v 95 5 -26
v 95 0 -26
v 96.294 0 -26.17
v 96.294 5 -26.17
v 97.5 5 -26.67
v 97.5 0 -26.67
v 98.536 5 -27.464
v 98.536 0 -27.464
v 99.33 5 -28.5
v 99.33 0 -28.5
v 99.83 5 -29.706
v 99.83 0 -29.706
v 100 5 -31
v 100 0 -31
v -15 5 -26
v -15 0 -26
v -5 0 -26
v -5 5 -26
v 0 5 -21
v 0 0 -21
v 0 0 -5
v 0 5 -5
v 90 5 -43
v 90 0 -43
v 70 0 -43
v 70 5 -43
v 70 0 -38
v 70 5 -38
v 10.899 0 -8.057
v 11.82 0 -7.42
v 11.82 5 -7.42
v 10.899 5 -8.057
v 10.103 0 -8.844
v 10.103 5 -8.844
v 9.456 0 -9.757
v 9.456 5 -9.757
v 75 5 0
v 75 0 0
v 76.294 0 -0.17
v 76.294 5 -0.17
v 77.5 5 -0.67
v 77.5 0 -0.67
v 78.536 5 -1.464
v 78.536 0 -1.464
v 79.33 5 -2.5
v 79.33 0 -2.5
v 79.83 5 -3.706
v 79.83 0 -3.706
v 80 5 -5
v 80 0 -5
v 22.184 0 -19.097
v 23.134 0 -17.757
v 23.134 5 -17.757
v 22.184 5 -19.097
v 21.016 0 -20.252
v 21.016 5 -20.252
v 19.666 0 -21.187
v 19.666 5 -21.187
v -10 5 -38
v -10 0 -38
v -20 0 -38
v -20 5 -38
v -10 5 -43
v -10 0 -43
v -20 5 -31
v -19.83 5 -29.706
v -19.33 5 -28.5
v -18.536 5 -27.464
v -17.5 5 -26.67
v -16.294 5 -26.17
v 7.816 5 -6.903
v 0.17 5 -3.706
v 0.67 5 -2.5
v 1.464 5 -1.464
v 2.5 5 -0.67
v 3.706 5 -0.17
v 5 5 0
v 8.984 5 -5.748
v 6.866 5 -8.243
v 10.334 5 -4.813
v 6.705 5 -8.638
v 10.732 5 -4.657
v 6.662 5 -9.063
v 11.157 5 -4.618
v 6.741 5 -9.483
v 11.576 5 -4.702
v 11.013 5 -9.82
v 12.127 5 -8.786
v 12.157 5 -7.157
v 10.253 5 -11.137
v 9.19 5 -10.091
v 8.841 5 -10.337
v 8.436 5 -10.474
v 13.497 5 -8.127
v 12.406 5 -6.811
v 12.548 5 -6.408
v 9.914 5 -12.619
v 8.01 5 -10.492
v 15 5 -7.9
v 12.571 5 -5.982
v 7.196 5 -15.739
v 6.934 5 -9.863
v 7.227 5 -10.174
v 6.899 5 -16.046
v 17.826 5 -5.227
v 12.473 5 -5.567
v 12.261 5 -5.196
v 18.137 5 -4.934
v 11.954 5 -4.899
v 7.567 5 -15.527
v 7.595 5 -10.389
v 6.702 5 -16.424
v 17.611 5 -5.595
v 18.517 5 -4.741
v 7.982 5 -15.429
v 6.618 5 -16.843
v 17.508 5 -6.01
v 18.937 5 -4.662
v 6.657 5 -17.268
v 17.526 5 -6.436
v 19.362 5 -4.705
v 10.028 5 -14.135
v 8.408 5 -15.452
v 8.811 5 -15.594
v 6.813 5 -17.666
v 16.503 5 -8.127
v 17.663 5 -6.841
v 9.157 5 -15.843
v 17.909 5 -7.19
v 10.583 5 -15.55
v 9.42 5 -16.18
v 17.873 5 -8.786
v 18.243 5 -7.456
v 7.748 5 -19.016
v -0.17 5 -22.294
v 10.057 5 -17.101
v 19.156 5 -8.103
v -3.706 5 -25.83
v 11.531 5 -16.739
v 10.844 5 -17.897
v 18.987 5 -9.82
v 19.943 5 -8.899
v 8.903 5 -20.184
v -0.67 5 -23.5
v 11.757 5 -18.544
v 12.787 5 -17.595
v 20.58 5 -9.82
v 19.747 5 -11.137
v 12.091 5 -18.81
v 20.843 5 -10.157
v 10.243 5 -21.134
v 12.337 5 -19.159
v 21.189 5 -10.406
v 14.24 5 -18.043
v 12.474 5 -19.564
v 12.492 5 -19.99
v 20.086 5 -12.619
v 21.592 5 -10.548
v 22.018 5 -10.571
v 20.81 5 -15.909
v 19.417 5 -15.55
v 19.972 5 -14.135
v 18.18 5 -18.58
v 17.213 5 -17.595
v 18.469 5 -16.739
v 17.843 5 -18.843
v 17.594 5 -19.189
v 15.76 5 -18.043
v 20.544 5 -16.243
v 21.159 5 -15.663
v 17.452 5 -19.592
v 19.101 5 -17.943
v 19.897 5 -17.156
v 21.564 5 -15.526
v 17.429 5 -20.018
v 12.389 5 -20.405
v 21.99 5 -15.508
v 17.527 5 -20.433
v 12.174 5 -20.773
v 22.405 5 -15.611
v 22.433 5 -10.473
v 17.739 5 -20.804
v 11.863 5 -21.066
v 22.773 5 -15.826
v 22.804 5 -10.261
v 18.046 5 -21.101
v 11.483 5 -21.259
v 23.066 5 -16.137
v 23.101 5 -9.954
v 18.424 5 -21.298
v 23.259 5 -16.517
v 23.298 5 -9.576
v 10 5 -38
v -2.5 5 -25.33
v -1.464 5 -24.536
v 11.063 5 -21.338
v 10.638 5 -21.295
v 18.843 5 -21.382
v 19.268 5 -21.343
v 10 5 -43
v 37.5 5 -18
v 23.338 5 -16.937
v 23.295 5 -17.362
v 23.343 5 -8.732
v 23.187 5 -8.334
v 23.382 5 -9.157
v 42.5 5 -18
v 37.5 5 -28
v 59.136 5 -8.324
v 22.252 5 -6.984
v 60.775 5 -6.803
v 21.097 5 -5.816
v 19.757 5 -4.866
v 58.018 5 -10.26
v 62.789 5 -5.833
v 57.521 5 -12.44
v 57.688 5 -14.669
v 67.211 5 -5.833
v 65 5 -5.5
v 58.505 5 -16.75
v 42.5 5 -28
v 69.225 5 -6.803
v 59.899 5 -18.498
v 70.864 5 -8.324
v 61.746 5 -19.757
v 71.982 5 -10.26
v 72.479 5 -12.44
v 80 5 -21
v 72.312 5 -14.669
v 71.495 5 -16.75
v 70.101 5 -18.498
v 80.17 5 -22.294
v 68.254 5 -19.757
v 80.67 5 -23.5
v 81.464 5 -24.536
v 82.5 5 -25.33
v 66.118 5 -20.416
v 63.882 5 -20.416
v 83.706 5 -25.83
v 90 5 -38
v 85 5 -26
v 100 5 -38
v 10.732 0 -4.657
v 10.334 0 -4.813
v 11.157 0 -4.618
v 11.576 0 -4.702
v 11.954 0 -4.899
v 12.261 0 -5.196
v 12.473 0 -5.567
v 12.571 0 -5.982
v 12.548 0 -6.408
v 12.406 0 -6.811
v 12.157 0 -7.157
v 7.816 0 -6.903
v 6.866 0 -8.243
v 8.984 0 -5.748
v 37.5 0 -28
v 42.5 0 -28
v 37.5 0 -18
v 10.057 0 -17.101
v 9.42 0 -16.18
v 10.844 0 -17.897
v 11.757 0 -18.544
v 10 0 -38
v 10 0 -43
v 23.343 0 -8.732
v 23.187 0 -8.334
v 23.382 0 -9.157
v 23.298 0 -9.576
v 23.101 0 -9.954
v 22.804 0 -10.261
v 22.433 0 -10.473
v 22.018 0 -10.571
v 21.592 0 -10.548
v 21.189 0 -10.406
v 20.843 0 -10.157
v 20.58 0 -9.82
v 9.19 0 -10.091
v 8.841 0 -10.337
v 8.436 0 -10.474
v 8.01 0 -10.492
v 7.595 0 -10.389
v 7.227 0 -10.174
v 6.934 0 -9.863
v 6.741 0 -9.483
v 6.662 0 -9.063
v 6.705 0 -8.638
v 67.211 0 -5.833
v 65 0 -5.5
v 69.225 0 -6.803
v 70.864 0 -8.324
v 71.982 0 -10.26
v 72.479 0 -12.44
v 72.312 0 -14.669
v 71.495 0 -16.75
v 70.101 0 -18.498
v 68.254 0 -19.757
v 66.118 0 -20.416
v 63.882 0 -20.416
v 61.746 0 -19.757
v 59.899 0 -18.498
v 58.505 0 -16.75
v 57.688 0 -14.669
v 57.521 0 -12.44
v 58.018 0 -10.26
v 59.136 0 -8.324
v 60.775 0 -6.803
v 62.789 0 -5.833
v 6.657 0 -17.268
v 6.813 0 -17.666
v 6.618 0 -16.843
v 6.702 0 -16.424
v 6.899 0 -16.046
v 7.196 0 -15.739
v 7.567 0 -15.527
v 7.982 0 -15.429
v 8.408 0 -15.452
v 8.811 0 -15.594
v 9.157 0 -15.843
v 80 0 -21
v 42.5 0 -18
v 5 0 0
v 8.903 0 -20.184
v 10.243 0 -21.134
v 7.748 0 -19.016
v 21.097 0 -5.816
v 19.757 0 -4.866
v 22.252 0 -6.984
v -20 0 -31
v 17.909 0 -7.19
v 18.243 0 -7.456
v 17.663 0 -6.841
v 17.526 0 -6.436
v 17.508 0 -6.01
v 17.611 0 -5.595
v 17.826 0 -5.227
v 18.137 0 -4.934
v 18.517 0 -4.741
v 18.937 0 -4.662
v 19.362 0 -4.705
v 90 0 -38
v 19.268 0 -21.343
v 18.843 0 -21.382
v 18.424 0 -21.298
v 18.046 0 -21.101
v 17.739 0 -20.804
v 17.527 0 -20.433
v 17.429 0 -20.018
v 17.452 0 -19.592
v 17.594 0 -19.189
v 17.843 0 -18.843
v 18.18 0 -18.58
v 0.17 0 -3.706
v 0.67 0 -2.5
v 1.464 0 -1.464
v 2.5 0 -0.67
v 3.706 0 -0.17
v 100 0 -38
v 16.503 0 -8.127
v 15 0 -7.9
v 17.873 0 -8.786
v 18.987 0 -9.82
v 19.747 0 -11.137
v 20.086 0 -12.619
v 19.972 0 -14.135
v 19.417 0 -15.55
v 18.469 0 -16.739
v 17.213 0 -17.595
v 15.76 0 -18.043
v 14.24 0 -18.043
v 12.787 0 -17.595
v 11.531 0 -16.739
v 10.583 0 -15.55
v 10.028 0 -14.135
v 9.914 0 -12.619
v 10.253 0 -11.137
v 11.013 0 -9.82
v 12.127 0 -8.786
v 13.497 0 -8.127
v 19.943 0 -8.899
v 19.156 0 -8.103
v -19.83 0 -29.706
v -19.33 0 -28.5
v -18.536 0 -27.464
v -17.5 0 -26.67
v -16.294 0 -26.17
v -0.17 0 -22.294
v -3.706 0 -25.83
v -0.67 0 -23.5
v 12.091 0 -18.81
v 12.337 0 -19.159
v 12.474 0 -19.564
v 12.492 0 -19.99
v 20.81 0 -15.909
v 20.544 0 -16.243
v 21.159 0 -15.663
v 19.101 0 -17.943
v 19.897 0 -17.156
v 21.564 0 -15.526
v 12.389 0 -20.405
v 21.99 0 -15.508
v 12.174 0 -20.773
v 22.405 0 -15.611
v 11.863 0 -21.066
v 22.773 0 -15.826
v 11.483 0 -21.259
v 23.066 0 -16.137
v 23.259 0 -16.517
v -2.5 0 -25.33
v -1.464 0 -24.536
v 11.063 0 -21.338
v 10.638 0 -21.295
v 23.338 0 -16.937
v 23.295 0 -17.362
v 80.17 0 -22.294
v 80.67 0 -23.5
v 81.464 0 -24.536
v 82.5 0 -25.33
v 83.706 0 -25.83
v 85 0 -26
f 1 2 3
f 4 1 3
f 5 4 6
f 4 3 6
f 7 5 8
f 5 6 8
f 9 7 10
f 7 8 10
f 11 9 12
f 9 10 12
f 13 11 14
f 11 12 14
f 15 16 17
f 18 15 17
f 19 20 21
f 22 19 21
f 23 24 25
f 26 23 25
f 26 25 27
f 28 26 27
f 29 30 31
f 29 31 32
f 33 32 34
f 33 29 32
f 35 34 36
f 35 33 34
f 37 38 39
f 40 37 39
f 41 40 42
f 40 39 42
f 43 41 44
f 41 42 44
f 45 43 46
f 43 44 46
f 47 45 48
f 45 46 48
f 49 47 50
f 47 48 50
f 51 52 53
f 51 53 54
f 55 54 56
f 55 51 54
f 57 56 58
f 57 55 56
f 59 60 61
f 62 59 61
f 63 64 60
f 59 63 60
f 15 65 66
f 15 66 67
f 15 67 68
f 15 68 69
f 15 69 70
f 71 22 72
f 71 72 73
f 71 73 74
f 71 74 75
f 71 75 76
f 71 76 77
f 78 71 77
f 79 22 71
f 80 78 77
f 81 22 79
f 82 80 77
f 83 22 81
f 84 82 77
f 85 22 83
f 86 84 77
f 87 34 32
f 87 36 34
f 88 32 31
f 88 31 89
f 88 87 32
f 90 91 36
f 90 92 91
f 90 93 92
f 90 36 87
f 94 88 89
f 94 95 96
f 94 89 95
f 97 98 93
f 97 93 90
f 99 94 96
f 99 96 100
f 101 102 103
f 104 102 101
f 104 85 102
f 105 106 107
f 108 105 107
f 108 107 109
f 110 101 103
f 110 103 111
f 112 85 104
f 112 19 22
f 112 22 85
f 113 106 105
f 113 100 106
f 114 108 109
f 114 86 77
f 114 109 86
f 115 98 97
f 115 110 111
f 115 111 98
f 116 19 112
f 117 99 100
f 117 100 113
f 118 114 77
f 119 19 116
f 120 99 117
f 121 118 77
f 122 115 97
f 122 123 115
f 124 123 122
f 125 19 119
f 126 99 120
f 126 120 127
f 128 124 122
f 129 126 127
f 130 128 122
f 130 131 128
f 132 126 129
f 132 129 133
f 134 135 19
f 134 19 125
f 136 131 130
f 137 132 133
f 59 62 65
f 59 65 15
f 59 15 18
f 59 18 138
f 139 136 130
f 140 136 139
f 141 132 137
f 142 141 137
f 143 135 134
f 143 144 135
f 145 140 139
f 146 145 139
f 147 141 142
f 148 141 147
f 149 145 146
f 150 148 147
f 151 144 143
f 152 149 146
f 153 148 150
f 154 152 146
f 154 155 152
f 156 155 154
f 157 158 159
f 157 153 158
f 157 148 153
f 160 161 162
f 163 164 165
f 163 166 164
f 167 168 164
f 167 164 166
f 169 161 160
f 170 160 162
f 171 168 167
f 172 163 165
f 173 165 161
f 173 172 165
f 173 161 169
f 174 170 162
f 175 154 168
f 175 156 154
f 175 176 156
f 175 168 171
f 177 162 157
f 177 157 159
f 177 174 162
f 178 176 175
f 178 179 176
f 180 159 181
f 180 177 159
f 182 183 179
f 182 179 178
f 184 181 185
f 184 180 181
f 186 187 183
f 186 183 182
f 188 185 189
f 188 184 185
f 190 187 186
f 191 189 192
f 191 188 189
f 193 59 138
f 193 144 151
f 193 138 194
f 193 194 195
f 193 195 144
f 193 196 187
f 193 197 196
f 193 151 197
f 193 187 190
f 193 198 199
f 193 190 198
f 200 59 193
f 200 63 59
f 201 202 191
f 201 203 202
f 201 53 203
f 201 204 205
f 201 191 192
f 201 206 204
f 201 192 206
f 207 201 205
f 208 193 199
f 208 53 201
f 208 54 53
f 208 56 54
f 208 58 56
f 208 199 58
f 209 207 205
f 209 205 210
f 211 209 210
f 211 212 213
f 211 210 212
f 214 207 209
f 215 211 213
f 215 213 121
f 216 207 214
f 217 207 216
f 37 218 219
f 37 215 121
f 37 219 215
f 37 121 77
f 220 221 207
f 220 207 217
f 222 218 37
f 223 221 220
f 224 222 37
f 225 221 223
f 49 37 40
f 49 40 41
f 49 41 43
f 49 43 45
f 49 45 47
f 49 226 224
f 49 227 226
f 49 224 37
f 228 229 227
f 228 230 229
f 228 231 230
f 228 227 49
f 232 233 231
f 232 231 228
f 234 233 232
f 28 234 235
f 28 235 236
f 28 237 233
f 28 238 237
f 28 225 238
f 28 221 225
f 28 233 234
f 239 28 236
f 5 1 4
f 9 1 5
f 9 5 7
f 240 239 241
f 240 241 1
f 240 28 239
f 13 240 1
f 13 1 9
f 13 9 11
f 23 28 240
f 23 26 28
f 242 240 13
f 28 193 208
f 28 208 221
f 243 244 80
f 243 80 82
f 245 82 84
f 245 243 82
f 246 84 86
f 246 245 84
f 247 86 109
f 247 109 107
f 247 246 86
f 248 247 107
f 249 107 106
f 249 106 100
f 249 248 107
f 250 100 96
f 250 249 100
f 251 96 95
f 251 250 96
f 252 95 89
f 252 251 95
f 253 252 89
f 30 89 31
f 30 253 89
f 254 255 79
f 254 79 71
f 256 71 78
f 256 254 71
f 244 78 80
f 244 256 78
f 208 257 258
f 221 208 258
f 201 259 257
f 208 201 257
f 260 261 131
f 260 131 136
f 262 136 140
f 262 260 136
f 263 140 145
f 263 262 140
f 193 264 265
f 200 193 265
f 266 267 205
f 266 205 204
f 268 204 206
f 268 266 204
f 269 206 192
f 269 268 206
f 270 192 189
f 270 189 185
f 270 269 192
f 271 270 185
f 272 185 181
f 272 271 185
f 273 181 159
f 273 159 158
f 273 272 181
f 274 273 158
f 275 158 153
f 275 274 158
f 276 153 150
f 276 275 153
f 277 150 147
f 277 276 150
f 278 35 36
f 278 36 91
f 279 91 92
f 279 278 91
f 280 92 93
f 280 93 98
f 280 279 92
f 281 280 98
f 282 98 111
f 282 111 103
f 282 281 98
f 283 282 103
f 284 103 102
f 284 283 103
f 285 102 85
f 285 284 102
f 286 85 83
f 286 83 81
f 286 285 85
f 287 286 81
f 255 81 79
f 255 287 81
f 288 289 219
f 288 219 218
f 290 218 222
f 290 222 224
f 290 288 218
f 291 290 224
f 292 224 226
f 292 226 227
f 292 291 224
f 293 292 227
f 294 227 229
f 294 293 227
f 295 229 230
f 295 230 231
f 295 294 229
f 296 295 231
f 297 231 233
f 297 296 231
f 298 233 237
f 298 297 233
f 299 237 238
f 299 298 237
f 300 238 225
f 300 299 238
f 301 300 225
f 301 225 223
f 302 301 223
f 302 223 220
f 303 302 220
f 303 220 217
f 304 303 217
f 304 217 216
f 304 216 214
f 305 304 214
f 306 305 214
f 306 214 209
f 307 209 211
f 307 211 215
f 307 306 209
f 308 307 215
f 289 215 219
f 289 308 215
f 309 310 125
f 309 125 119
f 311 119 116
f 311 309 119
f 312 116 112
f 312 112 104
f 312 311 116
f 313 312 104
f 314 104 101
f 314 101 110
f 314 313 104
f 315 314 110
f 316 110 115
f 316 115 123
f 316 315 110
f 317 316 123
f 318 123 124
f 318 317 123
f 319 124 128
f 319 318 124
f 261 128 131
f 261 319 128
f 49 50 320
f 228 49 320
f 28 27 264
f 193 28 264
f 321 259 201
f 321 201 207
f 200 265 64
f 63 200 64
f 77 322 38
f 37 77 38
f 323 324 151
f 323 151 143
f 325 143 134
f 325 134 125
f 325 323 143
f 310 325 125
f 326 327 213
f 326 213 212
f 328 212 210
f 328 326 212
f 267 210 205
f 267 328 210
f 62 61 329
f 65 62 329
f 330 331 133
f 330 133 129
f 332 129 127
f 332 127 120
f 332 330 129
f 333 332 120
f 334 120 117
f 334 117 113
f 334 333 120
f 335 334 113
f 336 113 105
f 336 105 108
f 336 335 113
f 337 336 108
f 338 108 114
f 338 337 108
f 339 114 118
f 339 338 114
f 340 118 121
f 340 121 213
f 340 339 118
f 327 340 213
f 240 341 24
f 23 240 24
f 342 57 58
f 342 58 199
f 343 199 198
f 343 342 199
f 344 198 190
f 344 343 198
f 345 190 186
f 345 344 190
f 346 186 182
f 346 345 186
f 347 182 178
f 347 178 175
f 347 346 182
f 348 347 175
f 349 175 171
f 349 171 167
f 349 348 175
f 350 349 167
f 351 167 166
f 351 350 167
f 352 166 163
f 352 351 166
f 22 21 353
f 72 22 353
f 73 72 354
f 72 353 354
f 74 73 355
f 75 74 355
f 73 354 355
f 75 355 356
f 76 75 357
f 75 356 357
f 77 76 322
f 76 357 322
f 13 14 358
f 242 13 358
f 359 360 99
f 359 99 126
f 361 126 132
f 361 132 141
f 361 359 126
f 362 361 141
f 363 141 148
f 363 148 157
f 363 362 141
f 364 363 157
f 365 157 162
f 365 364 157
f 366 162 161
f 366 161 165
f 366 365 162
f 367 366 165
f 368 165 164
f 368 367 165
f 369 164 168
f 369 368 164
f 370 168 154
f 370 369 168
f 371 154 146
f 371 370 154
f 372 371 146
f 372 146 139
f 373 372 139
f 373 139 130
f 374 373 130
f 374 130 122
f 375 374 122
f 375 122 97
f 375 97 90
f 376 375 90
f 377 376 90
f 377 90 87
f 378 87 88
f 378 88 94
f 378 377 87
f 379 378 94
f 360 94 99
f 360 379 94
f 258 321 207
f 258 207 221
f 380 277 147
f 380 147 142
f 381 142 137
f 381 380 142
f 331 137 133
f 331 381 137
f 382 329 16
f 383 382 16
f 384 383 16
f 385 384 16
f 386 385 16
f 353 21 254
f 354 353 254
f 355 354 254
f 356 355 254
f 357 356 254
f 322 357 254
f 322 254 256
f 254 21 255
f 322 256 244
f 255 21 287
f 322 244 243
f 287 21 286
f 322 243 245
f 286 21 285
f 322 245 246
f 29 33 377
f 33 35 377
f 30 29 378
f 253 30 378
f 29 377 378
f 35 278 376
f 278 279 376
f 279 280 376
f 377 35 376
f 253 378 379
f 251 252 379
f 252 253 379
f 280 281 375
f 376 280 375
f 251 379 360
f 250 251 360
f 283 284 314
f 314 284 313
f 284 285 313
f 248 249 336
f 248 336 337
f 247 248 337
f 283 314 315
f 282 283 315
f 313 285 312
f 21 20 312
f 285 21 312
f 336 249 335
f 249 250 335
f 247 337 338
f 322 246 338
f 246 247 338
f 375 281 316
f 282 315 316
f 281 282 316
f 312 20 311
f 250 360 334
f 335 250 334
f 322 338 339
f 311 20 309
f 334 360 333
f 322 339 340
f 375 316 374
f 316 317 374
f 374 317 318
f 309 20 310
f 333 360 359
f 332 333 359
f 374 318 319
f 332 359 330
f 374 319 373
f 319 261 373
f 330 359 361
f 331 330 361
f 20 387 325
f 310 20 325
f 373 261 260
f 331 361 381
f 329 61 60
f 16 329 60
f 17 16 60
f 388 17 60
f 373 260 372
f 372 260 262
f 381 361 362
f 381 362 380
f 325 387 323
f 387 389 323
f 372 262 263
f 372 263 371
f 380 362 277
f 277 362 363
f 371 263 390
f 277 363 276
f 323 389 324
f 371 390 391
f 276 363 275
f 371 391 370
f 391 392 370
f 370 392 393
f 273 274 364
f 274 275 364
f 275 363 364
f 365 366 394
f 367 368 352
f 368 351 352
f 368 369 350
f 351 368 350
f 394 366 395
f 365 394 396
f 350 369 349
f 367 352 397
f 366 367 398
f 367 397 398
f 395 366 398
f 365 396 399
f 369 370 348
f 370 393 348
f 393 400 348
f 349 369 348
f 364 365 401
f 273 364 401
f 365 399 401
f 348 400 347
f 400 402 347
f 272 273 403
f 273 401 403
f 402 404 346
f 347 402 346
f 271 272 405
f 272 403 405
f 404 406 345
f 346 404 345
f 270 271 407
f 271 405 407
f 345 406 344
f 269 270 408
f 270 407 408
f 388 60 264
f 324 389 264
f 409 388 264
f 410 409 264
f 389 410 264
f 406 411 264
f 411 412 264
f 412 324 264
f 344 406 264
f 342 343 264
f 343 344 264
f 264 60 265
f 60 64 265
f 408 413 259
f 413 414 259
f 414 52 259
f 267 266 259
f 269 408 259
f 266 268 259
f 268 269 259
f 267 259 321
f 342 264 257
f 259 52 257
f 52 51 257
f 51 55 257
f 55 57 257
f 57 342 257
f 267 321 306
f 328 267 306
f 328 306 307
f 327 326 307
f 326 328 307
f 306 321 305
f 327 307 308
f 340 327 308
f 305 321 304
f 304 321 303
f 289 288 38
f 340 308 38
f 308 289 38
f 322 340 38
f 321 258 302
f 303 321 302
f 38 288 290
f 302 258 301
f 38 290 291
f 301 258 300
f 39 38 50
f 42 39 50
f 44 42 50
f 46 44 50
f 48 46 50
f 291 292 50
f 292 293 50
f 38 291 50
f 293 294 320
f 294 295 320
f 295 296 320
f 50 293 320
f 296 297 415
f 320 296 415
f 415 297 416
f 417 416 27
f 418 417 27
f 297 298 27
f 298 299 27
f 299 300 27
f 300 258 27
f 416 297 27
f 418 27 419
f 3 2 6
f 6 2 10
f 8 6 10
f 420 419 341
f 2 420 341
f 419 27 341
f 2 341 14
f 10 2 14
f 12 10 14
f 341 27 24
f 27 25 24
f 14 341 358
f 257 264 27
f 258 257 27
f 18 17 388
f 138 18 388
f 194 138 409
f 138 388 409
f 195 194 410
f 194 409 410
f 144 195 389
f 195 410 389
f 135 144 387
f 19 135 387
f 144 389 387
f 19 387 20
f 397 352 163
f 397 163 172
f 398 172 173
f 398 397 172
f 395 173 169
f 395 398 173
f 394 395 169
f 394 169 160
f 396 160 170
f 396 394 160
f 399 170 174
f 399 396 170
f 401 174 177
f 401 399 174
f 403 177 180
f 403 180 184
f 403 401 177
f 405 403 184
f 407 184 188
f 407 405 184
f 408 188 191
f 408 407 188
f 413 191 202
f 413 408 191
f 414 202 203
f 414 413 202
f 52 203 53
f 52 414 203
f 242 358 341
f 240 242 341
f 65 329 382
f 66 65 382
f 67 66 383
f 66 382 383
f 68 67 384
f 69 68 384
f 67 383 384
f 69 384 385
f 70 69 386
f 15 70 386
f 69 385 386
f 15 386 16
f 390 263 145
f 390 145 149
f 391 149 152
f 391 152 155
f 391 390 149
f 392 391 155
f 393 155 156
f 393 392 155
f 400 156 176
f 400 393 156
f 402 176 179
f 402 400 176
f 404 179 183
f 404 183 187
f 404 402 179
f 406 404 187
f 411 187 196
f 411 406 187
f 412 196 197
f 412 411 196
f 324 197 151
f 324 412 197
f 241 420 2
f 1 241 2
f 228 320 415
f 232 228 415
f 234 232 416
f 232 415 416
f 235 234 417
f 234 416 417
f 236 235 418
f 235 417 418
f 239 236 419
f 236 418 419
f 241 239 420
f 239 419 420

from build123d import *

# Parameters (mm, degrees)
SKETCH_1_R      = 5.1
SKETCH_1_R_2    = 7.5
SKETCH_1_W      = 5
SKETCH_1_H      = 10
EXTRUDE_1_DEPTH = 5


with BuildPart() as part:
    # 草图1 → 凸台-拉伸1 (new body)
    with BuildSketch(Plane(origin=(0, 0, 0), x_dir=(1, 0, 0), z_dir=(0, 1, 0))):
        with BuildLine():
            Line((5, 0), (75, 0))
            ThreePointArc((75, 0), (78.535533906, 1.464466094), (80, 5))
            Line((80, 5), (80, 21))
            ThreePointArc((80, 21), (81.464466094, 24.535533906), (85, 26))
            Line((85, 26), (95, 26))
            ThreePointArc((95, 26), (98.535533906, 27.464466094), (100, 31))
            Line((100, 31), (100, 38))
            Line((100, 38), (90, 38))
            Line((90, 38), (90, 43))
            Line((90, 43), (70, 43))
            Line((70, 43), (70, 38))
            Line((70, 38), (10, 38))
            Line((10, 38), (10, 43))
            Line((10, 43), (-10, 43))
            Line((-10, 43), (-10, 38))
            Line((-10, 38), (-20, 38))
            Line((-20, 38), (-20, 31))
            ThreePointArc((-20, 31), (-18.535533906, 27.464466094), (-15, 26))
            Line((-15, 26), (-5, 26))
            ThreePointArc((-5, 26), (-1.464466094, 24.535533906), (0, 21))
            Line((0, 21), (0, 5))
            ThreePointArc((0, 5), (1.464466094, 1.464466094), (5, 0))
        make_face()
        with Locations(Location((15, 13, 0), (0, 0, 270))):
            Circle(SKETCH_1_R, mode=Mode.SUBTRACT)
        with Locations(Location((65, 13, 0), (0, 0, 270))):
            Circle(SKETCH_1_R_2, mode=Mode.SUBTRACT)
        with Locations((40, 23)):
            Rectangle(SKETCH_1_W, SKETCH_1_H, mode=Mode.SUBTRACT)
        with BuildLine():
            ThreePointArc((10.242718447, 21.134042717), (8.299573716, 19.625606863), (6.813051963, 17.665646852))
            ThreePointArc((6.813051963, 17.665646852), (7.373585621, 15.619723584), (9.419508889, 16.180257242))
            ThreePointArc((9.419508889, 16.180257242), (10.432770655, 17.516229984), (11.757281553, 18.544429117))
            ThreePointArc((11.757281553, 18.544429117), (12.2948068, 20.59651747), (10.242718447, 21.134042717))
        make_face(mode=Mode.SUBTRACT)
        with BuildLine():
            ThreePointArc((23.134042717, 17.757281553), (21.625606863, 19.700426284), (19.665646852, 21.186948037))
            ThreePointArc((19.665646852, 21.186948037), (17.619723584, 20.626414379), (18.180257242, 18.580491111))
            ThreePointArc((18.180257242, 18.580491111), (19.516229984, 17.567229345), (20.544429117, 16.242718447))
            ThreePointArc((20.544429117, 16.242718447), (22.59651747, 15.7051932), (23.134042717, 17.757281553))
        make_face(mode=Mode.SUBTRACT)
        with BuildLine():
            ThreePointArc((19.757281553, 4.865957283), (21.700426284, 6.374393137), (23.186948037, 8.334353148))
            ThreePointArc((23.186948037, 8.334353148), (22.626414379, 10.380276416), (20.580491111, 9.819742758))
            ThreePointArc((20.580491111, 9.819742758), (19.567229345, 8.483770016), (18.242718447, 7.455570883))
            ThreePointArc((18.242718447, 7.455570883), (17.7051932, 5.40348253), (19.757281553, 4.865957283))
        make_face(mode=Mode.SUBTRACT)
        with BuildLine():
            ThreePointArc((6.865957283, 8.242718447), (8.374393137, 6.299573716), (10.334353148, 4.813051963))
            ThreePointArc((10.334353148, 4.813051963), (12.380276416, 5.373585621), (11.819742758, 7.419508889))
            ThreePointArc((11.819742758, 7.419508889), (10.483770016, 8.432770655), (9.455570883, 9.757281553))
            ThreePointArc((9.455570883, 9.757281553), (7.40348253, 10.2948068), (6.865957283, 8.242718447))
        make_face(mode=Mode.SUBTRACT)
    extrude(amount=EXTRUDE_1_DEPTH)


solid = part.part
